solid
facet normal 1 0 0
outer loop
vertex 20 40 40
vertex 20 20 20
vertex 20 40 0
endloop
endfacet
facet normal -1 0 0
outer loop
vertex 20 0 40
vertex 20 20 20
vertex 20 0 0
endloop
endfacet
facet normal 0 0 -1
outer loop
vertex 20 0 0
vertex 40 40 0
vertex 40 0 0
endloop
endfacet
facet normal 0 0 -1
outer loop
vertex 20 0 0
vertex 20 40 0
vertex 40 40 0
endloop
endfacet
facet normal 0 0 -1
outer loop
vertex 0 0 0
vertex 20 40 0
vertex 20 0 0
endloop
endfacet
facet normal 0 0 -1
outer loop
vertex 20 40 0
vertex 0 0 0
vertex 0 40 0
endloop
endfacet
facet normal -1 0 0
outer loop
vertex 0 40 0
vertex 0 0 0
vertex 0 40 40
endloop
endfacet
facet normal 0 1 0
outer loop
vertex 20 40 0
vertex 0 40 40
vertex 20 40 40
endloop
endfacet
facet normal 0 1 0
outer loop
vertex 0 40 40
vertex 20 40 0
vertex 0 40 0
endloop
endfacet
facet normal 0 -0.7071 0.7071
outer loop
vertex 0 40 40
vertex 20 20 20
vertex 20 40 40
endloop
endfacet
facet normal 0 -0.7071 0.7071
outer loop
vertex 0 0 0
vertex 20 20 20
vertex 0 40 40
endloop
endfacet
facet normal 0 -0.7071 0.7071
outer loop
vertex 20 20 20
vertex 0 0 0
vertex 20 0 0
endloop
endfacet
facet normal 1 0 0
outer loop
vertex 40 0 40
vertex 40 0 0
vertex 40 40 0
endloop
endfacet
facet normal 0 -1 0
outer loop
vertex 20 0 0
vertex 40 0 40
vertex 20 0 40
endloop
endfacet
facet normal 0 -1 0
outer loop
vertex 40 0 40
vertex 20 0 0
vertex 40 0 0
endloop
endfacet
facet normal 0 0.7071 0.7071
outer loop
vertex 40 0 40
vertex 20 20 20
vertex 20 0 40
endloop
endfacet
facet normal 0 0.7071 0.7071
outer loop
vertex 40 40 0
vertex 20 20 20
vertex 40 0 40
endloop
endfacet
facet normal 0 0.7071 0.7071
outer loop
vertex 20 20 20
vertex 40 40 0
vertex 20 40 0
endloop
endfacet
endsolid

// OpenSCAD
difference(){
cube([20, 40, 40], center=false);
rotate([45,0,0])
cube([20, 60, 40], center=false);
}

translate([40,40,0])
rotate([0,0,180])
difference(){
cube([20, 40, 40], center=false);
rotate([45,0,0])
cube([20, 60, 40], center=false);
}
